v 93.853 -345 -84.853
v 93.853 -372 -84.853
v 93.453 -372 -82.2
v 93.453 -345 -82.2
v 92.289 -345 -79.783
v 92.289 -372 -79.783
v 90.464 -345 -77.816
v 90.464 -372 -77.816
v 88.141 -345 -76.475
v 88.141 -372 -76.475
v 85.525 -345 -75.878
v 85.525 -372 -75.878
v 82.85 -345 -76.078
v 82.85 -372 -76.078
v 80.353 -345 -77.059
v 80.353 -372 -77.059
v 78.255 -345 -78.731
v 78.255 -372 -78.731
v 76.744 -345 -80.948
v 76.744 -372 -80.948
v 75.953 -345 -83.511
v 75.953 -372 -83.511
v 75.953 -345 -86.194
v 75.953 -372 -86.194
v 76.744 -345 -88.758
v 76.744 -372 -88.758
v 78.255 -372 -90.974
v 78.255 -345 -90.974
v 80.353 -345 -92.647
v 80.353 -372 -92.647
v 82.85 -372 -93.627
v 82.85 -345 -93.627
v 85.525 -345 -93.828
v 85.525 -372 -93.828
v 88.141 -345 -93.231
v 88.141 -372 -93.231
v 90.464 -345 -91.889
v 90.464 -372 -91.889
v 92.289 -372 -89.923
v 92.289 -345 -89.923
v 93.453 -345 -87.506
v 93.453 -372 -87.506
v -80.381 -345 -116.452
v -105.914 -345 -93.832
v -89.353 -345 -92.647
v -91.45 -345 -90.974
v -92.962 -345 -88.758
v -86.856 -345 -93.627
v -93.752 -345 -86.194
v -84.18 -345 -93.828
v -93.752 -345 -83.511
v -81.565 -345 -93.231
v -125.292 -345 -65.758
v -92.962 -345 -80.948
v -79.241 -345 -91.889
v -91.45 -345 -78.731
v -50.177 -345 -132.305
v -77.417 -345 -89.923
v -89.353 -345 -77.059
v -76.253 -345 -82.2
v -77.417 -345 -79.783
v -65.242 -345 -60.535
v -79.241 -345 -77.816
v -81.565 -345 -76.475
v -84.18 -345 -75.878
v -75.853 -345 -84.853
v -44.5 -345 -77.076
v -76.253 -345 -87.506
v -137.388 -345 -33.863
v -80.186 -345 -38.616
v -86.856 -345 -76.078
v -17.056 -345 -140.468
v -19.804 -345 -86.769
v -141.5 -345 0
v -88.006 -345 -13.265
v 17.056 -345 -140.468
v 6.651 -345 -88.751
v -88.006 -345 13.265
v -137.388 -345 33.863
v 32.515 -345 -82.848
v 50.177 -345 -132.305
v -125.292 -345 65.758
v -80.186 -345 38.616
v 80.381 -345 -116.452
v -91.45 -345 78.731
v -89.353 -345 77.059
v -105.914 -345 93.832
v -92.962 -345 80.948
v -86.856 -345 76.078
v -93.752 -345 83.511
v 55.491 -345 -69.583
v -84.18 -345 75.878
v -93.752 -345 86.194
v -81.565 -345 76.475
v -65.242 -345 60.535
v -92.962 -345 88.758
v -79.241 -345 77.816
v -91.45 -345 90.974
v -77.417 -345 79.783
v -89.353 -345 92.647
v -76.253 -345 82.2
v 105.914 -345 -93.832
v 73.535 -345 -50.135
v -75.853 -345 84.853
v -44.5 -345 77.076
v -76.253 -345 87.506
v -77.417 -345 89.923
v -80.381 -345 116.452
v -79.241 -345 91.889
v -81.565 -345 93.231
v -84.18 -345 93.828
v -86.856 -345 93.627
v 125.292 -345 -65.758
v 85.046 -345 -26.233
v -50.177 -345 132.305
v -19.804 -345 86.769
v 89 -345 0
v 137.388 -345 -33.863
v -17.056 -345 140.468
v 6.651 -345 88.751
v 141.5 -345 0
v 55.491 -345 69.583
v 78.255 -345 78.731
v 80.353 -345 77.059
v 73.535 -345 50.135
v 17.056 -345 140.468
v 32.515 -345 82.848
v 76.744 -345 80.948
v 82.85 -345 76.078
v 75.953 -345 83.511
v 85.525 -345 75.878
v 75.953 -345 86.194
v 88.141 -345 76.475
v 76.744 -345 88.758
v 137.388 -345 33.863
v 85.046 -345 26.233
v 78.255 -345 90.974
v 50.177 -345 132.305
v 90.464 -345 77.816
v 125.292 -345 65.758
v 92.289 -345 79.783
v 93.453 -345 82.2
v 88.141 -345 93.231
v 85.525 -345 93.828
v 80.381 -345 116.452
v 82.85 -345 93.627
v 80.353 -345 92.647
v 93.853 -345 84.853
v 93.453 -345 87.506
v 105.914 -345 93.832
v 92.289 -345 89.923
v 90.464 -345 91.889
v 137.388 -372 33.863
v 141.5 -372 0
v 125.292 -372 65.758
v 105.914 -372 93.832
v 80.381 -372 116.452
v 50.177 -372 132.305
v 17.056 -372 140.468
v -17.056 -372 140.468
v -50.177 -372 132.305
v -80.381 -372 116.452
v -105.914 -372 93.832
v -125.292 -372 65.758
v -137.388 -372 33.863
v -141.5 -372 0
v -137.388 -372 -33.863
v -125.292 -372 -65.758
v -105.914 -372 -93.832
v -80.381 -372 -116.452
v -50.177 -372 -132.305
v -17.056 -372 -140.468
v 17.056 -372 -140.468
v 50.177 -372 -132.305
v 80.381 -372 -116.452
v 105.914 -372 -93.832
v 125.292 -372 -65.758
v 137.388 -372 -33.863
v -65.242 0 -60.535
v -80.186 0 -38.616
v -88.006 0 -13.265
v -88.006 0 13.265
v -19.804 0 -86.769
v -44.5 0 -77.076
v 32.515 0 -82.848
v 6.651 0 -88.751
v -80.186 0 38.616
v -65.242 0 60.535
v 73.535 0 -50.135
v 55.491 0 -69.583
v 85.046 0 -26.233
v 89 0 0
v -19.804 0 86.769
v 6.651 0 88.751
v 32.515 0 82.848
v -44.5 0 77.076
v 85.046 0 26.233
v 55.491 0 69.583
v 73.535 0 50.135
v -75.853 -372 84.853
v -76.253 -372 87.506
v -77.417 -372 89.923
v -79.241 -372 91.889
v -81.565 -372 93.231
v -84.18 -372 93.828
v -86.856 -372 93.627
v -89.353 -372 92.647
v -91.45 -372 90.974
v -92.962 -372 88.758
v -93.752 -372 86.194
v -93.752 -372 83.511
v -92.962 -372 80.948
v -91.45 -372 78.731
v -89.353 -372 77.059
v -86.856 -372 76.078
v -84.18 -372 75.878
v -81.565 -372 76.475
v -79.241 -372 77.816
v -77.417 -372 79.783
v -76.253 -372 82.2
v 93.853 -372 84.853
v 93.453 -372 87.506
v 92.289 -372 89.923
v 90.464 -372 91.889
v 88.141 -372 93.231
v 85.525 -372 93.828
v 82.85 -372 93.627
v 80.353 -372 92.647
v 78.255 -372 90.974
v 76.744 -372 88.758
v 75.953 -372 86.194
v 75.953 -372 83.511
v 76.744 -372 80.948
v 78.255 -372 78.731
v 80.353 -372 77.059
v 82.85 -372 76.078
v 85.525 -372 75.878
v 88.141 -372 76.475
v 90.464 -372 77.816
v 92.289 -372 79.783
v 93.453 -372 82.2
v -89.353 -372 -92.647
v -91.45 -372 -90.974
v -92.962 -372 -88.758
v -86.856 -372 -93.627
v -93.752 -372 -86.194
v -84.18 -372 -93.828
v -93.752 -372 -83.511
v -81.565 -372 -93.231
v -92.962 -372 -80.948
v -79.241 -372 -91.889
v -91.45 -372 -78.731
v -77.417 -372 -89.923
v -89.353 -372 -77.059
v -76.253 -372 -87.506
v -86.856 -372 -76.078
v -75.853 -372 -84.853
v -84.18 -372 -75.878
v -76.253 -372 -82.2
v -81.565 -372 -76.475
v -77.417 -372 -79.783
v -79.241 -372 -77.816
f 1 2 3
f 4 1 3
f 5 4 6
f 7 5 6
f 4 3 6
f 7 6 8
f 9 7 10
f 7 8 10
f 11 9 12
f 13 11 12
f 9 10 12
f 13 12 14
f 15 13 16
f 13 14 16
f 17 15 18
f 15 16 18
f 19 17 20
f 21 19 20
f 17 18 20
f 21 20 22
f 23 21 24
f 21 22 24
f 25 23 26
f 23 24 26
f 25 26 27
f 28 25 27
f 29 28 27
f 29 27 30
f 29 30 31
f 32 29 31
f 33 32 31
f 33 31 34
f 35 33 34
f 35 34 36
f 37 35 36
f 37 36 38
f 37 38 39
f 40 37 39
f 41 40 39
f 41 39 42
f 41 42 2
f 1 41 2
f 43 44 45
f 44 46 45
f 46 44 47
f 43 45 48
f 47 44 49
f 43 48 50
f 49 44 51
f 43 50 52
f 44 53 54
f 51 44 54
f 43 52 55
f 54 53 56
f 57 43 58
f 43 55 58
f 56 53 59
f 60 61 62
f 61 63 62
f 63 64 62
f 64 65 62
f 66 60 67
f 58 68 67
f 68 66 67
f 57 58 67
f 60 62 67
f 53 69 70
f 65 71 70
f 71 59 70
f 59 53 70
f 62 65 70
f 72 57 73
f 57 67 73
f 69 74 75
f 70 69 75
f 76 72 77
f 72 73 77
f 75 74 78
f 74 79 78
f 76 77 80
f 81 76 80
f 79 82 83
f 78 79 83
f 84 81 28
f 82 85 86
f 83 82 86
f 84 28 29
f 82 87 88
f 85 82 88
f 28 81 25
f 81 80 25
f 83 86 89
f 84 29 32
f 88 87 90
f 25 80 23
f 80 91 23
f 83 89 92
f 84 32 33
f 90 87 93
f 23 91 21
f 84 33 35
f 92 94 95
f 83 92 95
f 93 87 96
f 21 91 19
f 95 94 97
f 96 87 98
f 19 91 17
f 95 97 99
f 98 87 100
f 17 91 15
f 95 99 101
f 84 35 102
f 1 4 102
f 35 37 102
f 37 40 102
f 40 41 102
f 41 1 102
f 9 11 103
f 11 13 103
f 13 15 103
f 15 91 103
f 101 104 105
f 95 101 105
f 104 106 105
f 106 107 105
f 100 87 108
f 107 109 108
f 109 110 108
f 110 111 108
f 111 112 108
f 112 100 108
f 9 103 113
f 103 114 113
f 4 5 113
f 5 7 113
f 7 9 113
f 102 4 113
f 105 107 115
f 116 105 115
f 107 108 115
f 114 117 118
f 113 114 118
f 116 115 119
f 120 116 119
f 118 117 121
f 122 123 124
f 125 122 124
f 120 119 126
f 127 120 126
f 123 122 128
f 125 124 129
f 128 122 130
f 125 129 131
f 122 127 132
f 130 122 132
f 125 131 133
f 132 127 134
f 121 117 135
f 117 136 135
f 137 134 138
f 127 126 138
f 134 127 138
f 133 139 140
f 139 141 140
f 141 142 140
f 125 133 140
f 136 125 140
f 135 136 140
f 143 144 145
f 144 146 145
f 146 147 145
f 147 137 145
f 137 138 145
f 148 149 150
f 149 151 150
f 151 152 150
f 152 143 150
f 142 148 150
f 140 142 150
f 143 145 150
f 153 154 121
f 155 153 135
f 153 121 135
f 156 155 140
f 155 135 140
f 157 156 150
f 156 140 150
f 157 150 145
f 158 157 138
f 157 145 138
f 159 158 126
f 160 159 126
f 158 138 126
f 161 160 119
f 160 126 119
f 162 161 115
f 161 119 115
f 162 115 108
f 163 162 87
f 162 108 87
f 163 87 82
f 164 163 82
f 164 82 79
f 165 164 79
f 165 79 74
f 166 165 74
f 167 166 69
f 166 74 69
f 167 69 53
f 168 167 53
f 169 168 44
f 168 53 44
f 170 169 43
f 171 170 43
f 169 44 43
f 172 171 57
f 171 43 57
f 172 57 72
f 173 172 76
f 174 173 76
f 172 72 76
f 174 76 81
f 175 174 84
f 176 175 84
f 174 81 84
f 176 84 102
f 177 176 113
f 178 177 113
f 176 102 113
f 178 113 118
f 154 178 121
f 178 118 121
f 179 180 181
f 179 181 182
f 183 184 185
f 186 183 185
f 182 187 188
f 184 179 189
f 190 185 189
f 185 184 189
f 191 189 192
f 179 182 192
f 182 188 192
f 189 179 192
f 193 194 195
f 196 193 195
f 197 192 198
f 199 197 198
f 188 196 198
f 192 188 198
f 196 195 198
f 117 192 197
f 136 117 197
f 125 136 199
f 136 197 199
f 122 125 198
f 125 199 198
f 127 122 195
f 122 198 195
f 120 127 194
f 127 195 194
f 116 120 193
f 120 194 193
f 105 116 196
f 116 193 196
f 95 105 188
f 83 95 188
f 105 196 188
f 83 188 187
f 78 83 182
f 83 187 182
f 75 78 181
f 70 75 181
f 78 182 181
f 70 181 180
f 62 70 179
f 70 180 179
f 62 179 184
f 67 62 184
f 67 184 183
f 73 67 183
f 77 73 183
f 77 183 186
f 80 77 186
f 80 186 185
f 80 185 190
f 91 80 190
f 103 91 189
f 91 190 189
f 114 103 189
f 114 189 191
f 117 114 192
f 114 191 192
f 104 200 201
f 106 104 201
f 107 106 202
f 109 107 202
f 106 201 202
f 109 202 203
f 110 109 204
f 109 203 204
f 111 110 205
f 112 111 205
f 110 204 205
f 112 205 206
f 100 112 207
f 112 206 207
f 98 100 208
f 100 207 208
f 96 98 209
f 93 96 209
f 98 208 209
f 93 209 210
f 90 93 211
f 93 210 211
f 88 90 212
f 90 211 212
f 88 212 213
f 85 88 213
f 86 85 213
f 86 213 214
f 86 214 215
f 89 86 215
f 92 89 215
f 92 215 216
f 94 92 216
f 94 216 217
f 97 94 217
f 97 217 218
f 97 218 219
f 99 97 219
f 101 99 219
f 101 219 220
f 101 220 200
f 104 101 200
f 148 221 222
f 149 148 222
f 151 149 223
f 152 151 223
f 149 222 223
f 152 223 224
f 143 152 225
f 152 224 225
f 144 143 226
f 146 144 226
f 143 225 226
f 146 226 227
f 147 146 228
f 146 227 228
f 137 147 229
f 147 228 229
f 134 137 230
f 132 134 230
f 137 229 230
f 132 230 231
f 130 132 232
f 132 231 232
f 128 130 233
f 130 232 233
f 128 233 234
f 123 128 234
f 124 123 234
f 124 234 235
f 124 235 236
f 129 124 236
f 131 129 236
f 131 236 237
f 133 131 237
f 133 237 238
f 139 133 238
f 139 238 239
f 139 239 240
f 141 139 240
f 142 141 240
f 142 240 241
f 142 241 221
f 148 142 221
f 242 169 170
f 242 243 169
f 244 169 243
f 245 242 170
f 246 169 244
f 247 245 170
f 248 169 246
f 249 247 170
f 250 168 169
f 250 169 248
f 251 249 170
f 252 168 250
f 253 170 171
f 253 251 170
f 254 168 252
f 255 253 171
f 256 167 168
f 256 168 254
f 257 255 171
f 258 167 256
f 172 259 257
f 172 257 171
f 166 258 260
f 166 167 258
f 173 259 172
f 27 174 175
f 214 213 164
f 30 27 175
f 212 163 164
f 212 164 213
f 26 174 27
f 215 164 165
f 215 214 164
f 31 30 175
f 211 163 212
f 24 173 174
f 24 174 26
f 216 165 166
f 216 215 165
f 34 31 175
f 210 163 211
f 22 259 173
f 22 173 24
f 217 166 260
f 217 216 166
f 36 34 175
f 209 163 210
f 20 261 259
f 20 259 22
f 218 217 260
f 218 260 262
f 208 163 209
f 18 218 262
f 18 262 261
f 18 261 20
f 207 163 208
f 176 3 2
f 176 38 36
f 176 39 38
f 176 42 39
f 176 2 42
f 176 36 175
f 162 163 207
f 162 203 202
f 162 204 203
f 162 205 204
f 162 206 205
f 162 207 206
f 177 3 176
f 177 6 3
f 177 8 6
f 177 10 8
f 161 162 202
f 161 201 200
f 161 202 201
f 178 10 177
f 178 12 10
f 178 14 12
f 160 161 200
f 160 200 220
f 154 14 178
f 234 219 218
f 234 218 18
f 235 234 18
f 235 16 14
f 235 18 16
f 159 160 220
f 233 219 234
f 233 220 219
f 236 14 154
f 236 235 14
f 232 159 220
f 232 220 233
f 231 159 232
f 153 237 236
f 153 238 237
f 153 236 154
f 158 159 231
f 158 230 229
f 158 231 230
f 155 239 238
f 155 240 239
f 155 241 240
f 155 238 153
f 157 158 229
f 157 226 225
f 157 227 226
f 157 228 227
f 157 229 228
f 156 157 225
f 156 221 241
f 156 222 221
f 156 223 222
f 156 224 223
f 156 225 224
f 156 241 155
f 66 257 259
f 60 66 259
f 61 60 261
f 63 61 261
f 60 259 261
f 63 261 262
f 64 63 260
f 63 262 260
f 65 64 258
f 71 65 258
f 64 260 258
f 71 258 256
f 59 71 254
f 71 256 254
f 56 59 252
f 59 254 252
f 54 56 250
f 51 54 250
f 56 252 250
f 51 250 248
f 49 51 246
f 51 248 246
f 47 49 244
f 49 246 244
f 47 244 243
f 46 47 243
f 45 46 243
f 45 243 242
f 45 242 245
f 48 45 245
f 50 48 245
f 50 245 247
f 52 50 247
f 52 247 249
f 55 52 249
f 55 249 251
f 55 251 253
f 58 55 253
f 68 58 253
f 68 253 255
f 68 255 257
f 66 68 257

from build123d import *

# Parameters (mm, degrees)
F0_R     = 89
F1_DEPTH = 345
F2_R     = 141.5
F3_DEPTH = 27
F4_R     = 9
F5_DEPTH = 372.001


with BuildPart() as f1:
    # F0 (on Front) → F1 (new body)
    with BuildSketch(Plane.XZ):
        Circle(F0_R)
    extrude(amount=F1_DEPTH)

    # F2 (on face) → F3 (join)
    with BuildSketch(Plane.XZ.offset(345)):
        Circle(F2_R)
    extrude(amount=F3_DEPTH)

    # F4 (on face) → F5 (cut, through all)
    with BuildSketch(Plane.XZ.offset(372)):
        with Locations((-84.852814, 84.852814)):
            Circle(F4_R)
        with Locations((-84.852814, -84.852814)):
            Circle(F4_R)
        with Locations((84.852814, -84.852814)):
            Circle(F4_R)
        with Locations((84.852814, 84.852814)):
            Circle(F4_R)
    extrude(amount=-F5_DEPTH, mode=Mode.SUBTRACT)


solid = f1.part
